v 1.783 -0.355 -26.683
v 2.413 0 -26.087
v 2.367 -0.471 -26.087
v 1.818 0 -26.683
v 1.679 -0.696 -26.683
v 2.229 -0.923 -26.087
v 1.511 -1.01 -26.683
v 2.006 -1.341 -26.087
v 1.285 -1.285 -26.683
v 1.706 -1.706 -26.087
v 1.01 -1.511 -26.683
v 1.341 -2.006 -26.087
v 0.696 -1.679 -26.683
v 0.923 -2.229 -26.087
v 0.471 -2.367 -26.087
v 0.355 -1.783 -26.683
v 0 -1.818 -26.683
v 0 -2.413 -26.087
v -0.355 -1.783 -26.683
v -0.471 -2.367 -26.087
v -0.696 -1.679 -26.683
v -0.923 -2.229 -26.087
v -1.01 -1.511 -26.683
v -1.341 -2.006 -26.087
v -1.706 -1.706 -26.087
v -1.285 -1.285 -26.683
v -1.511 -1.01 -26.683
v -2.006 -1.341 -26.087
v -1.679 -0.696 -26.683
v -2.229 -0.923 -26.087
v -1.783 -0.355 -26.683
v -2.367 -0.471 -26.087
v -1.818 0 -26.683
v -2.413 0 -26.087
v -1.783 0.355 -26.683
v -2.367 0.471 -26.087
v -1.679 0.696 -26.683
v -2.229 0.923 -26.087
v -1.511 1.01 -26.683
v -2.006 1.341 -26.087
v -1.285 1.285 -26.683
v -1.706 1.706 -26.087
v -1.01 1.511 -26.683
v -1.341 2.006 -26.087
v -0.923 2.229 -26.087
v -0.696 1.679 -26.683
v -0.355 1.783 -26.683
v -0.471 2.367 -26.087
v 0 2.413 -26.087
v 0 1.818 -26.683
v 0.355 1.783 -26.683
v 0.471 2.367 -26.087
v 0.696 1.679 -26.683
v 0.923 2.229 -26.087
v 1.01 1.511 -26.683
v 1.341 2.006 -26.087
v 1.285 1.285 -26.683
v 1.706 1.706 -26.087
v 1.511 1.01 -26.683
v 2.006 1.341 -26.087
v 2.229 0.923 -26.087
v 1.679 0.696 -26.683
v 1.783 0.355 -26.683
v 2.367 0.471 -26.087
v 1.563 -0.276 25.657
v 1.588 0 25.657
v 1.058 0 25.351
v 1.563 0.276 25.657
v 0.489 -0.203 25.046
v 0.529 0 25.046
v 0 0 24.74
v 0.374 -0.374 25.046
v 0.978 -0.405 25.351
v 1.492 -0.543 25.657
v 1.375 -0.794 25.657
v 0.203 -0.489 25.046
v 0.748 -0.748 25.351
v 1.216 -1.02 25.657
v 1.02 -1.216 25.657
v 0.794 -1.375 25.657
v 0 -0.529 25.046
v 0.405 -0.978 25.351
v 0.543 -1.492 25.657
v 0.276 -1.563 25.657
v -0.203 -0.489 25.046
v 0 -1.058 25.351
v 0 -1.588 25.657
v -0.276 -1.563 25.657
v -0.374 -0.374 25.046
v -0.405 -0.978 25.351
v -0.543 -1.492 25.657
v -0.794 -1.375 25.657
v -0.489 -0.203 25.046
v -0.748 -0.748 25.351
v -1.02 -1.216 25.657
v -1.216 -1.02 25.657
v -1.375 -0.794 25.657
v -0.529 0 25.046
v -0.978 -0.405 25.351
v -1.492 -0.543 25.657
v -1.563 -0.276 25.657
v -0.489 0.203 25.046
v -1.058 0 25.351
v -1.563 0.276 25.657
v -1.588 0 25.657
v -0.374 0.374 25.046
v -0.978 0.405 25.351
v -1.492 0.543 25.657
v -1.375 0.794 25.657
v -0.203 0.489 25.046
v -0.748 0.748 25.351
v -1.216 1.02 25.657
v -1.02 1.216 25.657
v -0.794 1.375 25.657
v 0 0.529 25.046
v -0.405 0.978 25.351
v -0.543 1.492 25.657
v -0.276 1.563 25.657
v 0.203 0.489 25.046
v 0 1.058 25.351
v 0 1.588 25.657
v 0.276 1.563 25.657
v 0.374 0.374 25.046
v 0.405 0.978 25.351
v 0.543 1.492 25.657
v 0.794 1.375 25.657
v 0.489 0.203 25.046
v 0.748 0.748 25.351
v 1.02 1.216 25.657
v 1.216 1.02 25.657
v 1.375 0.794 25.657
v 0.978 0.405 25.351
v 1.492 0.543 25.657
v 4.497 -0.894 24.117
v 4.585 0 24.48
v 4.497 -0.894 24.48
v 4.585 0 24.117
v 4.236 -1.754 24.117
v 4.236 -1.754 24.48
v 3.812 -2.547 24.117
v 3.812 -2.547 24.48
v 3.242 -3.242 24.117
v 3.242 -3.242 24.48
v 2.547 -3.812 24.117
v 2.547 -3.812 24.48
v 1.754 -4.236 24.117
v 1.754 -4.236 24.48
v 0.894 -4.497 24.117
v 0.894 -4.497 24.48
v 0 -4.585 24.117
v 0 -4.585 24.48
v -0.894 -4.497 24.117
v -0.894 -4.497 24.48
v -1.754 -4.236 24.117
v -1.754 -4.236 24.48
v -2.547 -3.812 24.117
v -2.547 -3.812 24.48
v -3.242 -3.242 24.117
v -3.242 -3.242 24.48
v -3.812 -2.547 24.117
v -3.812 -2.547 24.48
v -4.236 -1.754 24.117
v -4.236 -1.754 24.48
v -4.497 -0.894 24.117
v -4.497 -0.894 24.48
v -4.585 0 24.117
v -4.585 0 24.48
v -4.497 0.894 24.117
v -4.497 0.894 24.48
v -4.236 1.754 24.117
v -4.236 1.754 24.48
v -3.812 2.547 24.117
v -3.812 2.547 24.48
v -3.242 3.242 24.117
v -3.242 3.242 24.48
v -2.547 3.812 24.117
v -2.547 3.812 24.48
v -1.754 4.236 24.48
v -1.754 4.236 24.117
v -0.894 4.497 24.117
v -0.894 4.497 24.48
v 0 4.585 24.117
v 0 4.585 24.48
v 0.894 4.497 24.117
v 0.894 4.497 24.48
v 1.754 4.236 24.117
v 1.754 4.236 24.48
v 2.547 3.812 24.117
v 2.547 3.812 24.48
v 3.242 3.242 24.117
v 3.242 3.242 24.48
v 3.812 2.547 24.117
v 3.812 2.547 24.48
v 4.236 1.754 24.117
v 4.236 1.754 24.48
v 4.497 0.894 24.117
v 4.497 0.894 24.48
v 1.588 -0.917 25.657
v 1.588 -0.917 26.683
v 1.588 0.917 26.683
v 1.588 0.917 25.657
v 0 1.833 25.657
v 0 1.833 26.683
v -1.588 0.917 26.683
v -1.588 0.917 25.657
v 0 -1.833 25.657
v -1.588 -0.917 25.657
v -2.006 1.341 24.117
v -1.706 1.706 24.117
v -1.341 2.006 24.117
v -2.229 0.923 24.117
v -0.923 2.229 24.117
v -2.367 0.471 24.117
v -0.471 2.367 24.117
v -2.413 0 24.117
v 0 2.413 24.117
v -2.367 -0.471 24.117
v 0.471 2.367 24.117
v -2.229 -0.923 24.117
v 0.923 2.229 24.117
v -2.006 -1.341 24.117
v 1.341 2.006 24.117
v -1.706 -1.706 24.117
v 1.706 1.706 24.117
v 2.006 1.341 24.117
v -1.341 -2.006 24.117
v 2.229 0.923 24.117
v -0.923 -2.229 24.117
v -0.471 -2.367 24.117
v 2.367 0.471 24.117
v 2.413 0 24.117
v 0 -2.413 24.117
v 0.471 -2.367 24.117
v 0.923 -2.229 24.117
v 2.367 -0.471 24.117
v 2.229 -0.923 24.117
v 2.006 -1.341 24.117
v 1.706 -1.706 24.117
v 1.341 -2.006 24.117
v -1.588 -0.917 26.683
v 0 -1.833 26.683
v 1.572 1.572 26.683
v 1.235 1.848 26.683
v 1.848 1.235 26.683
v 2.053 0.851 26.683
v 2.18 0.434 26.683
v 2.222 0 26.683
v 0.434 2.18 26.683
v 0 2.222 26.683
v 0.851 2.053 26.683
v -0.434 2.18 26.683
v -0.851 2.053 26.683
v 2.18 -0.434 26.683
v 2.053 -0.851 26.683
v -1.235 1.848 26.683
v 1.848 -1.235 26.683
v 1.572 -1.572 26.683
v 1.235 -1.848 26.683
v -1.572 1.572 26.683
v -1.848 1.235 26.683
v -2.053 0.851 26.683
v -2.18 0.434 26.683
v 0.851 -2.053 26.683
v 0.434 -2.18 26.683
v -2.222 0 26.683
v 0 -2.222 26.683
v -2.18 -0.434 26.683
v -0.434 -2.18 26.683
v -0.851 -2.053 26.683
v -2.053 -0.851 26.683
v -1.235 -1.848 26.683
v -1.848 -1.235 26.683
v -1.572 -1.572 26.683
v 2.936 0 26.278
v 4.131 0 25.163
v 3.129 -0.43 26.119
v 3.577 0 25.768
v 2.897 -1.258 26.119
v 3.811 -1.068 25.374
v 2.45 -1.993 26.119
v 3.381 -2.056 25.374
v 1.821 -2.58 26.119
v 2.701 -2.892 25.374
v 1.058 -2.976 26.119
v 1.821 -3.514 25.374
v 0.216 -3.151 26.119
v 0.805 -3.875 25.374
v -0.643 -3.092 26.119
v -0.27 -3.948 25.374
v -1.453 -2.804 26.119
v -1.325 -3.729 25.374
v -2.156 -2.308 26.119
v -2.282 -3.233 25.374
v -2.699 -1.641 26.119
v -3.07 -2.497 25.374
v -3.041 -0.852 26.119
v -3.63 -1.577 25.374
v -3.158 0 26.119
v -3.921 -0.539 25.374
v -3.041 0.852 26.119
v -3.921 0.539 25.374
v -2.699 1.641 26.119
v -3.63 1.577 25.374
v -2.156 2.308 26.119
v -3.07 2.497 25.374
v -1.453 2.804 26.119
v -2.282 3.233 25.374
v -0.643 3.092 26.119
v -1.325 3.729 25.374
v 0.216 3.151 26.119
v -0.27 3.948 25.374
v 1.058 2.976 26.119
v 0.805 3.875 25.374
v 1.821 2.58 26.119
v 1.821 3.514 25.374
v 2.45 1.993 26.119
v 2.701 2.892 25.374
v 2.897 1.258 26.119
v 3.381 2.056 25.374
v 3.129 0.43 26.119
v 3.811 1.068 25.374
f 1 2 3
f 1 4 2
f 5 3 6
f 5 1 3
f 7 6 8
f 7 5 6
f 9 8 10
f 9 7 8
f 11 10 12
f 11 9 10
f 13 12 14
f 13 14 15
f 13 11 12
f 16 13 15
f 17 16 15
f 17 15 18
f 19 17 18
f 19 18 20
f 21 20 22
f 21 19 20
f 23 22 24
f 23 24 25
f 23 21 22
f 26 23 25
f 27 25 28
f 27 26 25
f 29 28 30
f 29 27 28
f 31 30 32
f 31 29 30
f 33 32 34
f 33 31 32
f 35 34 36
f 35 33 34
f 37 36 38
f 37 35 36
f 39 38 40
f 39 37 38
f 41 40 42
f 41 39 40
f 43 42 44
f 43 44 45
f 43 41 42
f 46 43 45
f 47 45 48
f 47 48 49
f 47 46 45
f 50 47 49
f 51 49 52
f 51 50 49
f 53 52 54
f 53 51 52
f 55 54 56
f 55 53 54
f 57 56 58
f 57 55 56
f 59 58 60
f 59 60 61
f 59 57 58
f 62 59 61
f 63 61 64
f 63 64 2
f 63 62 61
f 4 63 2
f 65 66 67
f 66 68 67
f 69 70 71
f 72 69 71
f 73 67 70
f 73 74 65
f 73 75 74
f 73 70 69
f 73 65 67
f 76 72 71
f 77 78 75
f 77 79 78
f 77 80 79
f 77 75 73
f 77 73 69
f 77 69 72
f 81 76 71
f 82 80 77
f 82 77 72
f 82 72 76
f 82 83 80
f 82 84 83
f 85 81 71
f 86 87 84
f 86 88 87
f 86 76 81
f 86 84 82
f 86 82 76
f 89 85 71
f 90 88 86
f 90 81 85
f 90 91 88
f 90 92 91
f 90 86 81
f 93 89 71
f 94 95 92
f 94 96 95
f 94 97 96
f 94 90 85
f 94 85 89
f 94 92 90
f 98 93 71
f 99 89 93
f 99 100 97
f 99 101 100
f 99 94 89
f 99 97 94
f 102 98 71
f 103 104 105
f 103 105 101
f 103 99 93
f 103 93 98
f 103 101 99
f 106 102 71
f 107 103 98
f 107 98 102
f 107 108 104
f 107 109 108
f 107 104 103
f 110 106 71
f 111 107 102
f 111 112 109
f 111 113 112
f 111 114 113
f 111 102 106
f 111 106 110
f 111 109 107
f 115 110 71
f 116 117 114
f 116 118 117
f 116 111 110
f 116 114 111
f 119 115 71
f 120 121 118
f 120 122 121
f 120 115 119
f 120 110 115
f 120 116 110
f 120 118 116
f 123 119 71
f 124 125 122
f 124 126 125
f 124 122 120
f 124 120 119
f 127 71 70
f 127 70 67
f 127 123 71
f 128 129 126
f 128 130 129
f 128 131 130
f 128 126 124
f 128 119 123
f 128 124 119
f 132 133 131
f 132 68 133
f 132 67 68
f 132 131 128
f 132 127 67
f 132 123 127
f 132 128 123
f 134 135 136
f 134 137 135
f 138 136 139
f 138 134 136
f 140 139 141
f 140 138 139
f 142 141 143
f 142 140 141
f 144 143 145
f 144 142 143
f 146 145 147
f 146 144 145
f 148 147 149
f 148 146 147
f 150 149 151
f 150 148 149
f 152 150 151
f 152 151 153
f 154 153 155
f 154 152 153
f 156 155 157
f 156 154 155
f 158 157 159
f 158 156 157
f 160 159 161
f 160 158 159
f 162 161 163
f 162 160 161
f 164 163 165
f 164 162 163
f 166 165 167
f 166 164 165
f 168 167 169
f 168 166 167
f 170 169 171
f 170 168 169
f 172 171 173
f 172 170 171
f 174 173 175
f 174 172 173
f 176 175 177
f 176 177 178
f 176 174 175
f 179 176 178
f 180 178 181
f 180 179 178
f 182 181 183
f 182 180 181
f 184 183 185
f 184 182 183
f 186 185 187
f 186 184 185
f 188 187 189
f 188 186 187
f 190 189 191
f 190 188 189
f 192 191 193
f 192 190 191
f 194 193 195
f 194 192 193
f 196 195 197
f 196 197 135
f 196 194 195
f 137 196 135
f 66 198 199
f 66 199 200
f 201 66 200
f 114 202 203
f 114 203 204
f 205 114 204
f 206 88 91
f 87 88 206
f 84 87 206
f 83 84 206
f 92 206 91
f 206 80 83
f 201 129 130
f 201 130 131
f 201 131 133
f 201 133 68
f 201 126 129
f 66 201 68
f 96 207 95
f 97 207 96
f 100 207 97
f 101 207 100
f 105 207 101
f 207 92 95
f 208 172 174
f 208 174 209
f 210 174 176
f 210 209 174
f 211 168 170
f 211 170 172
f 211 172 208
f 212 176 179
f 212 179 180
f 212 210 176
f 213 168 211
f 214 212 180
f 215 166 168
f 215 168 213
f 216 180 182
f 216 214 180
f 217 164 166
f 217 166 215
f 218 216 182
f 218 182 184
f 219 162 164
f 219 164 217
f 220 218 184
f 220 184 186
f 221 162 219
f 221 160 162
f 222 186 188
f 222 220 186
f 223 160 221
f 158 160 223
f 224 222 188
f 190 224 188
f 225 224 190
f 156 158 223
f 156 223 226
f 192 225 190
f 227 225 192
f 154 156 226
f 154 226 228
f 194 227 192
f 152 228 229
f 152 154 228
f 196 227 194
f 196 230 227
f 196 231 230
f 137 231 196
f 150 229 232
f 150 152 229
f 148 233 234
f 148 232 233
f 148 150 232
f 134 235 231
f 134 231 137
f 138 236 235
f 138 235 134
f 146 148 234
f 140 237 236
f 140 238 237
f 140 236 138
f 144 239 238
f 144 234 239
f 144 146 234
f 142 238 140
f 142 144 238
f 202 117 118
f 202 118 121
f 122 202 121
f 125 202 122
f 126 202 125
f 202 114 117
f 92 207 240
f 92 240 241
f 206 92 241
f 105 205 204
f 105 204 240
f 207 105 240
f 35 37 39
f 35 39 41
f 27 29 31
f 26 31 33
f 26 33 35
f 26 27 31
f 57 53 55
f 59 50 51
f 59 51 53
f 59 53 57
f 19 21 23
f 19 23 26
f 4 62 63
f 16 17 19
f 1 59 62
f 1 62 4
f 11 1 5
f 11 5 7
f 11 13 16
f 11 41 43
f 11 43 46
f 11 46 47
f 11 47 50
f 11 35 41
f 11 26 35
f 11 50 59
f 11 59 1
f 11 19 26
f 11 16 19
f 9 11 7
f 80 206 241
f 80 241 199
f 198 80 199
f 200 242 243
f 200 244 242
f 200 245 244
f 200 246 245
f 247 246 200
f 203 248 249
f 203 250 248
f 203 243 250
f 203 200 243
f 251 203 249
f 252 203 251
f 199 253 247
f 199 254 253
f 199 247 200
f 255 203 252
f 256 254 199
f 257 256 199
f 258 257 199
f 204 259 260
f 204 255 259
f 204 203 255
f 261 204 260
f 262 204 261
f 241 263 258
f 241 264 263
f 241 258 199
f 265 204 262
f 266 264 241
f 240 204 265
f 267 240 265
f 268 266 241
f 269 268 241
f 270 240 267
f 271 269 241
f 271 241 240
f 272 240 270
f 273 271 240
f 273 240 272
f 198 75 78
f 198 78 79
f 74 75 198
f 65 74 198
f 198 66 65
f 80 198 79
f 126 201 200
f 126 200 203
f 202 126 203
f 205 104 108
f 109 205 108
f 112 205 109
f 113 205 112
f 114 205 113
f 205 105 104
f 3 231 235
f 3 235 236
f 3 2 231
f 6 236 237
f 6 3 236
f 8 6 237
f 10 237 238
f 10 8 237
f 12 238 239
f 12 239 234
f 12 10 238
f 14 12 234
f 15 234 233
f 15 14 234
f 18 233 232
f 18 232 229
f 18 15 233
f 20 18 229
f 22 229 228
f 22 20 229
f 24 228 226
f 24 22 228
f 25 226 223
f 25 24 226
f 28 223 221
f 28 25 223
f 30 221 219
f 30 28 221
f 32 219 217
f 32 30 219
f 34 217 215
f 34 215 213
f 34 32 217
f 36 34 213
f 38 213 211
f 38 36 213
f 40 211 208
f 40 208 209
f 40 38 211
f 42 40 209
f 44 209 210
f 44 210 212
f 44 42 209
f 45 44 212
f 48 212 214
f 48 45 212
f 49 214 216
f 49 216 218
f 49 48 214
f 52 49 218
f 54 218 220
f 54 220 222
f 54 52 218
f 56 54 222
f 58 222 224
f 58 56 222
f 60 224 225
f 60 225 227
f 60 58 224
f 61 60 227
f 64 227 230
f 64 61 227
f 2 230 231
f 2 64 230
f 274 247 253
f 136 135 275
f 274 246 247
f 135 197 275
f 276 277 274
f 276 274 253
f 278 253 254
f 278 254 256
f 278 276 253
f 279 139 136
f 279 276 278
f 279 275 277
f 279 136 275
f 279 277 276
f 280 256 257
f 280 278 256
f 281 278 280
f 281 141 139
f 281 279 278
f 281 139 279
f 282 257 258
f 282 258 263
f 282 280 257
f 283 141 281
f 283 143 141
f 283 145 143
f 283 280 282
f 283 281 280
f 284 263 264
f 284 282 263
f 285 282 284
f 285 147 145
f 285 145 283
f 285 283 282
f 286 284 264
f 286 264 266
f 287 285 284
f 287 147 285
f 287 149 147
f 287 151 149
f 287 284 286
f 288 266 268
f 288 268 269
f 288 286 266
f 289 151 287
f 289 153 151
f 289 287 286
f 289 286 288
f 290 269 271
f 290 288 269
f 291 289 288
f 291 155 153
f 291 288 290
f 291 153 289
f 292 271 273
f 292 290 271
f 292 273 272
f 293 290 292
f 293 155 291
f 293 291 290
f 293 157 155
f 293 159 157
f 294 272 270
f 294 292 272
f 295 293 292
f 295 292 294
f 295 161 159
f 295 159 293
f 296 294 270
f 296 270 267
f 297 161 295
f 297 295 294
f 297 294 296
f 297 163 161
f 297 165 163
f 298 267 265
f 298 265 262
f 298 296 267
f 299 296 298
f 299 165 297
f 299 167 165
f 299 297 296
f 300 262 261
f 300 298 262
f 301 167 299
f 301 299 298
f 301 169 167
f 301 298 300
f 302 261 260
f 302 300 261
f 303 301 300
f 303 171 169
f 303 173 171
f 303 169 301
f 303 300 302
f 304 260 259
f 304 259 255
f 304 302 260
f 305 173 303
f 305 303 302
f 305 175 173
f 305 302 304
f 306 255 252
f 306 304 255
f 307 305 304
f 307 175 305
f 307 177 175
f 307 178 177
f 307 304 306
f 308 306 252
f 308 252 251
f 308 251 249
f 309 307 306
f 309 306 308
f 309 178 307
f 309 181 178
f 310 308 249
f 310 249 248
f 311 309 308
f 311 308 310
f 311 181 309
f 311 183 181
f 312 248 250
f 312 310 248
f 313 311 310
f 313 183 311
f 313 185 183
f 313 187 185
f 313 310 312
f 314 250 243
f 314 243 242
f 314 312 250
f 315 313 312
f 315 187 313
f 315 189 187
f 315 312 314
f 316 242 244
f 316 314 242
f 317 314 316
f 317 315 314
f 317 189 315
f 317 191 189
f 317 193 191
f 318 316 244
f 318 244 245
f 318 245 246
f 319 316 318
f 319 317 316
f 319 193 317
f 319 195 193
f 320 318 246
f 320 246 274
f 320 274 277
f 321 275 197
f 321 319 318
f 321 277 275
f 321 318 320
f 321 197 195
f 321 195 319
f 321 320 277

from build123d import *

# Parameters (mm, degrees)
CUT_EXTRUDE1_START = 25.65654
CUT_EXTRUDE1_DEPTH = 2.802619264


with BuildPart() as part:
    # Sketch2 → Revolve1 (revolve)
    with BuildSketch(Plane(origin=(0, 0, 0), x_dir=(0, 0, -1), z_dir=(1, 0, 0)), mode=Mode.PRIVATE) as revolve1_sk:
        with BuildLine():
            Line((-26.6827, 1.5875), (-26.6827, 2.2225))
            ThreePointArc((-26.6827, 2.2225), (-25.767752118, 3.57733025), (-24.480157143, 4.5847))
            Line((-24.480157143, 4.5847), (-24.1173, 4.5847))
            Line((-24.1173, 4.5847), (-24.1173, 2.413))
            Line((-24.1173, 2.413), (26.0873875, 2.413))
            Line((26.0873875, 2.413), (26.6827, 1.8176875))
            Line((26.6827, 1.8176875), (26.6827, 0))
            Line((26.6827, 0), (-24.739996448, 0))
            Line((-24.739996448, 0), (-25.65654, 1.5875))
            Line((-25.65654, 1.5875), (-26.6827, 1.5875))
        make_face()
    revolve(revolve1_sk.sketch.rotate(Axis((0, 0, 26.6827), (0, 0, -1)), 90), axis=Axis((0, 0, 26.6827), (0, 0, -1)))

    # Sketch3 → Cut-Extrude1 (cut, through all)
    with BuildSketch(Plane.XY.offset(CUT_EXTRUDE1_START)):
        Polygon((0, 1.833087105), (-1.5875, 0.916543552), (-1.5875, -0.916543552), (0, -1.833087105), (1.5875, -0.916543552), (1.5875, 0.916543552), align=None)
    extrude(amount=CUT_EXTRUDE1_DEPTH, mode=Mode.SUBTRACT)


solid = part.part
